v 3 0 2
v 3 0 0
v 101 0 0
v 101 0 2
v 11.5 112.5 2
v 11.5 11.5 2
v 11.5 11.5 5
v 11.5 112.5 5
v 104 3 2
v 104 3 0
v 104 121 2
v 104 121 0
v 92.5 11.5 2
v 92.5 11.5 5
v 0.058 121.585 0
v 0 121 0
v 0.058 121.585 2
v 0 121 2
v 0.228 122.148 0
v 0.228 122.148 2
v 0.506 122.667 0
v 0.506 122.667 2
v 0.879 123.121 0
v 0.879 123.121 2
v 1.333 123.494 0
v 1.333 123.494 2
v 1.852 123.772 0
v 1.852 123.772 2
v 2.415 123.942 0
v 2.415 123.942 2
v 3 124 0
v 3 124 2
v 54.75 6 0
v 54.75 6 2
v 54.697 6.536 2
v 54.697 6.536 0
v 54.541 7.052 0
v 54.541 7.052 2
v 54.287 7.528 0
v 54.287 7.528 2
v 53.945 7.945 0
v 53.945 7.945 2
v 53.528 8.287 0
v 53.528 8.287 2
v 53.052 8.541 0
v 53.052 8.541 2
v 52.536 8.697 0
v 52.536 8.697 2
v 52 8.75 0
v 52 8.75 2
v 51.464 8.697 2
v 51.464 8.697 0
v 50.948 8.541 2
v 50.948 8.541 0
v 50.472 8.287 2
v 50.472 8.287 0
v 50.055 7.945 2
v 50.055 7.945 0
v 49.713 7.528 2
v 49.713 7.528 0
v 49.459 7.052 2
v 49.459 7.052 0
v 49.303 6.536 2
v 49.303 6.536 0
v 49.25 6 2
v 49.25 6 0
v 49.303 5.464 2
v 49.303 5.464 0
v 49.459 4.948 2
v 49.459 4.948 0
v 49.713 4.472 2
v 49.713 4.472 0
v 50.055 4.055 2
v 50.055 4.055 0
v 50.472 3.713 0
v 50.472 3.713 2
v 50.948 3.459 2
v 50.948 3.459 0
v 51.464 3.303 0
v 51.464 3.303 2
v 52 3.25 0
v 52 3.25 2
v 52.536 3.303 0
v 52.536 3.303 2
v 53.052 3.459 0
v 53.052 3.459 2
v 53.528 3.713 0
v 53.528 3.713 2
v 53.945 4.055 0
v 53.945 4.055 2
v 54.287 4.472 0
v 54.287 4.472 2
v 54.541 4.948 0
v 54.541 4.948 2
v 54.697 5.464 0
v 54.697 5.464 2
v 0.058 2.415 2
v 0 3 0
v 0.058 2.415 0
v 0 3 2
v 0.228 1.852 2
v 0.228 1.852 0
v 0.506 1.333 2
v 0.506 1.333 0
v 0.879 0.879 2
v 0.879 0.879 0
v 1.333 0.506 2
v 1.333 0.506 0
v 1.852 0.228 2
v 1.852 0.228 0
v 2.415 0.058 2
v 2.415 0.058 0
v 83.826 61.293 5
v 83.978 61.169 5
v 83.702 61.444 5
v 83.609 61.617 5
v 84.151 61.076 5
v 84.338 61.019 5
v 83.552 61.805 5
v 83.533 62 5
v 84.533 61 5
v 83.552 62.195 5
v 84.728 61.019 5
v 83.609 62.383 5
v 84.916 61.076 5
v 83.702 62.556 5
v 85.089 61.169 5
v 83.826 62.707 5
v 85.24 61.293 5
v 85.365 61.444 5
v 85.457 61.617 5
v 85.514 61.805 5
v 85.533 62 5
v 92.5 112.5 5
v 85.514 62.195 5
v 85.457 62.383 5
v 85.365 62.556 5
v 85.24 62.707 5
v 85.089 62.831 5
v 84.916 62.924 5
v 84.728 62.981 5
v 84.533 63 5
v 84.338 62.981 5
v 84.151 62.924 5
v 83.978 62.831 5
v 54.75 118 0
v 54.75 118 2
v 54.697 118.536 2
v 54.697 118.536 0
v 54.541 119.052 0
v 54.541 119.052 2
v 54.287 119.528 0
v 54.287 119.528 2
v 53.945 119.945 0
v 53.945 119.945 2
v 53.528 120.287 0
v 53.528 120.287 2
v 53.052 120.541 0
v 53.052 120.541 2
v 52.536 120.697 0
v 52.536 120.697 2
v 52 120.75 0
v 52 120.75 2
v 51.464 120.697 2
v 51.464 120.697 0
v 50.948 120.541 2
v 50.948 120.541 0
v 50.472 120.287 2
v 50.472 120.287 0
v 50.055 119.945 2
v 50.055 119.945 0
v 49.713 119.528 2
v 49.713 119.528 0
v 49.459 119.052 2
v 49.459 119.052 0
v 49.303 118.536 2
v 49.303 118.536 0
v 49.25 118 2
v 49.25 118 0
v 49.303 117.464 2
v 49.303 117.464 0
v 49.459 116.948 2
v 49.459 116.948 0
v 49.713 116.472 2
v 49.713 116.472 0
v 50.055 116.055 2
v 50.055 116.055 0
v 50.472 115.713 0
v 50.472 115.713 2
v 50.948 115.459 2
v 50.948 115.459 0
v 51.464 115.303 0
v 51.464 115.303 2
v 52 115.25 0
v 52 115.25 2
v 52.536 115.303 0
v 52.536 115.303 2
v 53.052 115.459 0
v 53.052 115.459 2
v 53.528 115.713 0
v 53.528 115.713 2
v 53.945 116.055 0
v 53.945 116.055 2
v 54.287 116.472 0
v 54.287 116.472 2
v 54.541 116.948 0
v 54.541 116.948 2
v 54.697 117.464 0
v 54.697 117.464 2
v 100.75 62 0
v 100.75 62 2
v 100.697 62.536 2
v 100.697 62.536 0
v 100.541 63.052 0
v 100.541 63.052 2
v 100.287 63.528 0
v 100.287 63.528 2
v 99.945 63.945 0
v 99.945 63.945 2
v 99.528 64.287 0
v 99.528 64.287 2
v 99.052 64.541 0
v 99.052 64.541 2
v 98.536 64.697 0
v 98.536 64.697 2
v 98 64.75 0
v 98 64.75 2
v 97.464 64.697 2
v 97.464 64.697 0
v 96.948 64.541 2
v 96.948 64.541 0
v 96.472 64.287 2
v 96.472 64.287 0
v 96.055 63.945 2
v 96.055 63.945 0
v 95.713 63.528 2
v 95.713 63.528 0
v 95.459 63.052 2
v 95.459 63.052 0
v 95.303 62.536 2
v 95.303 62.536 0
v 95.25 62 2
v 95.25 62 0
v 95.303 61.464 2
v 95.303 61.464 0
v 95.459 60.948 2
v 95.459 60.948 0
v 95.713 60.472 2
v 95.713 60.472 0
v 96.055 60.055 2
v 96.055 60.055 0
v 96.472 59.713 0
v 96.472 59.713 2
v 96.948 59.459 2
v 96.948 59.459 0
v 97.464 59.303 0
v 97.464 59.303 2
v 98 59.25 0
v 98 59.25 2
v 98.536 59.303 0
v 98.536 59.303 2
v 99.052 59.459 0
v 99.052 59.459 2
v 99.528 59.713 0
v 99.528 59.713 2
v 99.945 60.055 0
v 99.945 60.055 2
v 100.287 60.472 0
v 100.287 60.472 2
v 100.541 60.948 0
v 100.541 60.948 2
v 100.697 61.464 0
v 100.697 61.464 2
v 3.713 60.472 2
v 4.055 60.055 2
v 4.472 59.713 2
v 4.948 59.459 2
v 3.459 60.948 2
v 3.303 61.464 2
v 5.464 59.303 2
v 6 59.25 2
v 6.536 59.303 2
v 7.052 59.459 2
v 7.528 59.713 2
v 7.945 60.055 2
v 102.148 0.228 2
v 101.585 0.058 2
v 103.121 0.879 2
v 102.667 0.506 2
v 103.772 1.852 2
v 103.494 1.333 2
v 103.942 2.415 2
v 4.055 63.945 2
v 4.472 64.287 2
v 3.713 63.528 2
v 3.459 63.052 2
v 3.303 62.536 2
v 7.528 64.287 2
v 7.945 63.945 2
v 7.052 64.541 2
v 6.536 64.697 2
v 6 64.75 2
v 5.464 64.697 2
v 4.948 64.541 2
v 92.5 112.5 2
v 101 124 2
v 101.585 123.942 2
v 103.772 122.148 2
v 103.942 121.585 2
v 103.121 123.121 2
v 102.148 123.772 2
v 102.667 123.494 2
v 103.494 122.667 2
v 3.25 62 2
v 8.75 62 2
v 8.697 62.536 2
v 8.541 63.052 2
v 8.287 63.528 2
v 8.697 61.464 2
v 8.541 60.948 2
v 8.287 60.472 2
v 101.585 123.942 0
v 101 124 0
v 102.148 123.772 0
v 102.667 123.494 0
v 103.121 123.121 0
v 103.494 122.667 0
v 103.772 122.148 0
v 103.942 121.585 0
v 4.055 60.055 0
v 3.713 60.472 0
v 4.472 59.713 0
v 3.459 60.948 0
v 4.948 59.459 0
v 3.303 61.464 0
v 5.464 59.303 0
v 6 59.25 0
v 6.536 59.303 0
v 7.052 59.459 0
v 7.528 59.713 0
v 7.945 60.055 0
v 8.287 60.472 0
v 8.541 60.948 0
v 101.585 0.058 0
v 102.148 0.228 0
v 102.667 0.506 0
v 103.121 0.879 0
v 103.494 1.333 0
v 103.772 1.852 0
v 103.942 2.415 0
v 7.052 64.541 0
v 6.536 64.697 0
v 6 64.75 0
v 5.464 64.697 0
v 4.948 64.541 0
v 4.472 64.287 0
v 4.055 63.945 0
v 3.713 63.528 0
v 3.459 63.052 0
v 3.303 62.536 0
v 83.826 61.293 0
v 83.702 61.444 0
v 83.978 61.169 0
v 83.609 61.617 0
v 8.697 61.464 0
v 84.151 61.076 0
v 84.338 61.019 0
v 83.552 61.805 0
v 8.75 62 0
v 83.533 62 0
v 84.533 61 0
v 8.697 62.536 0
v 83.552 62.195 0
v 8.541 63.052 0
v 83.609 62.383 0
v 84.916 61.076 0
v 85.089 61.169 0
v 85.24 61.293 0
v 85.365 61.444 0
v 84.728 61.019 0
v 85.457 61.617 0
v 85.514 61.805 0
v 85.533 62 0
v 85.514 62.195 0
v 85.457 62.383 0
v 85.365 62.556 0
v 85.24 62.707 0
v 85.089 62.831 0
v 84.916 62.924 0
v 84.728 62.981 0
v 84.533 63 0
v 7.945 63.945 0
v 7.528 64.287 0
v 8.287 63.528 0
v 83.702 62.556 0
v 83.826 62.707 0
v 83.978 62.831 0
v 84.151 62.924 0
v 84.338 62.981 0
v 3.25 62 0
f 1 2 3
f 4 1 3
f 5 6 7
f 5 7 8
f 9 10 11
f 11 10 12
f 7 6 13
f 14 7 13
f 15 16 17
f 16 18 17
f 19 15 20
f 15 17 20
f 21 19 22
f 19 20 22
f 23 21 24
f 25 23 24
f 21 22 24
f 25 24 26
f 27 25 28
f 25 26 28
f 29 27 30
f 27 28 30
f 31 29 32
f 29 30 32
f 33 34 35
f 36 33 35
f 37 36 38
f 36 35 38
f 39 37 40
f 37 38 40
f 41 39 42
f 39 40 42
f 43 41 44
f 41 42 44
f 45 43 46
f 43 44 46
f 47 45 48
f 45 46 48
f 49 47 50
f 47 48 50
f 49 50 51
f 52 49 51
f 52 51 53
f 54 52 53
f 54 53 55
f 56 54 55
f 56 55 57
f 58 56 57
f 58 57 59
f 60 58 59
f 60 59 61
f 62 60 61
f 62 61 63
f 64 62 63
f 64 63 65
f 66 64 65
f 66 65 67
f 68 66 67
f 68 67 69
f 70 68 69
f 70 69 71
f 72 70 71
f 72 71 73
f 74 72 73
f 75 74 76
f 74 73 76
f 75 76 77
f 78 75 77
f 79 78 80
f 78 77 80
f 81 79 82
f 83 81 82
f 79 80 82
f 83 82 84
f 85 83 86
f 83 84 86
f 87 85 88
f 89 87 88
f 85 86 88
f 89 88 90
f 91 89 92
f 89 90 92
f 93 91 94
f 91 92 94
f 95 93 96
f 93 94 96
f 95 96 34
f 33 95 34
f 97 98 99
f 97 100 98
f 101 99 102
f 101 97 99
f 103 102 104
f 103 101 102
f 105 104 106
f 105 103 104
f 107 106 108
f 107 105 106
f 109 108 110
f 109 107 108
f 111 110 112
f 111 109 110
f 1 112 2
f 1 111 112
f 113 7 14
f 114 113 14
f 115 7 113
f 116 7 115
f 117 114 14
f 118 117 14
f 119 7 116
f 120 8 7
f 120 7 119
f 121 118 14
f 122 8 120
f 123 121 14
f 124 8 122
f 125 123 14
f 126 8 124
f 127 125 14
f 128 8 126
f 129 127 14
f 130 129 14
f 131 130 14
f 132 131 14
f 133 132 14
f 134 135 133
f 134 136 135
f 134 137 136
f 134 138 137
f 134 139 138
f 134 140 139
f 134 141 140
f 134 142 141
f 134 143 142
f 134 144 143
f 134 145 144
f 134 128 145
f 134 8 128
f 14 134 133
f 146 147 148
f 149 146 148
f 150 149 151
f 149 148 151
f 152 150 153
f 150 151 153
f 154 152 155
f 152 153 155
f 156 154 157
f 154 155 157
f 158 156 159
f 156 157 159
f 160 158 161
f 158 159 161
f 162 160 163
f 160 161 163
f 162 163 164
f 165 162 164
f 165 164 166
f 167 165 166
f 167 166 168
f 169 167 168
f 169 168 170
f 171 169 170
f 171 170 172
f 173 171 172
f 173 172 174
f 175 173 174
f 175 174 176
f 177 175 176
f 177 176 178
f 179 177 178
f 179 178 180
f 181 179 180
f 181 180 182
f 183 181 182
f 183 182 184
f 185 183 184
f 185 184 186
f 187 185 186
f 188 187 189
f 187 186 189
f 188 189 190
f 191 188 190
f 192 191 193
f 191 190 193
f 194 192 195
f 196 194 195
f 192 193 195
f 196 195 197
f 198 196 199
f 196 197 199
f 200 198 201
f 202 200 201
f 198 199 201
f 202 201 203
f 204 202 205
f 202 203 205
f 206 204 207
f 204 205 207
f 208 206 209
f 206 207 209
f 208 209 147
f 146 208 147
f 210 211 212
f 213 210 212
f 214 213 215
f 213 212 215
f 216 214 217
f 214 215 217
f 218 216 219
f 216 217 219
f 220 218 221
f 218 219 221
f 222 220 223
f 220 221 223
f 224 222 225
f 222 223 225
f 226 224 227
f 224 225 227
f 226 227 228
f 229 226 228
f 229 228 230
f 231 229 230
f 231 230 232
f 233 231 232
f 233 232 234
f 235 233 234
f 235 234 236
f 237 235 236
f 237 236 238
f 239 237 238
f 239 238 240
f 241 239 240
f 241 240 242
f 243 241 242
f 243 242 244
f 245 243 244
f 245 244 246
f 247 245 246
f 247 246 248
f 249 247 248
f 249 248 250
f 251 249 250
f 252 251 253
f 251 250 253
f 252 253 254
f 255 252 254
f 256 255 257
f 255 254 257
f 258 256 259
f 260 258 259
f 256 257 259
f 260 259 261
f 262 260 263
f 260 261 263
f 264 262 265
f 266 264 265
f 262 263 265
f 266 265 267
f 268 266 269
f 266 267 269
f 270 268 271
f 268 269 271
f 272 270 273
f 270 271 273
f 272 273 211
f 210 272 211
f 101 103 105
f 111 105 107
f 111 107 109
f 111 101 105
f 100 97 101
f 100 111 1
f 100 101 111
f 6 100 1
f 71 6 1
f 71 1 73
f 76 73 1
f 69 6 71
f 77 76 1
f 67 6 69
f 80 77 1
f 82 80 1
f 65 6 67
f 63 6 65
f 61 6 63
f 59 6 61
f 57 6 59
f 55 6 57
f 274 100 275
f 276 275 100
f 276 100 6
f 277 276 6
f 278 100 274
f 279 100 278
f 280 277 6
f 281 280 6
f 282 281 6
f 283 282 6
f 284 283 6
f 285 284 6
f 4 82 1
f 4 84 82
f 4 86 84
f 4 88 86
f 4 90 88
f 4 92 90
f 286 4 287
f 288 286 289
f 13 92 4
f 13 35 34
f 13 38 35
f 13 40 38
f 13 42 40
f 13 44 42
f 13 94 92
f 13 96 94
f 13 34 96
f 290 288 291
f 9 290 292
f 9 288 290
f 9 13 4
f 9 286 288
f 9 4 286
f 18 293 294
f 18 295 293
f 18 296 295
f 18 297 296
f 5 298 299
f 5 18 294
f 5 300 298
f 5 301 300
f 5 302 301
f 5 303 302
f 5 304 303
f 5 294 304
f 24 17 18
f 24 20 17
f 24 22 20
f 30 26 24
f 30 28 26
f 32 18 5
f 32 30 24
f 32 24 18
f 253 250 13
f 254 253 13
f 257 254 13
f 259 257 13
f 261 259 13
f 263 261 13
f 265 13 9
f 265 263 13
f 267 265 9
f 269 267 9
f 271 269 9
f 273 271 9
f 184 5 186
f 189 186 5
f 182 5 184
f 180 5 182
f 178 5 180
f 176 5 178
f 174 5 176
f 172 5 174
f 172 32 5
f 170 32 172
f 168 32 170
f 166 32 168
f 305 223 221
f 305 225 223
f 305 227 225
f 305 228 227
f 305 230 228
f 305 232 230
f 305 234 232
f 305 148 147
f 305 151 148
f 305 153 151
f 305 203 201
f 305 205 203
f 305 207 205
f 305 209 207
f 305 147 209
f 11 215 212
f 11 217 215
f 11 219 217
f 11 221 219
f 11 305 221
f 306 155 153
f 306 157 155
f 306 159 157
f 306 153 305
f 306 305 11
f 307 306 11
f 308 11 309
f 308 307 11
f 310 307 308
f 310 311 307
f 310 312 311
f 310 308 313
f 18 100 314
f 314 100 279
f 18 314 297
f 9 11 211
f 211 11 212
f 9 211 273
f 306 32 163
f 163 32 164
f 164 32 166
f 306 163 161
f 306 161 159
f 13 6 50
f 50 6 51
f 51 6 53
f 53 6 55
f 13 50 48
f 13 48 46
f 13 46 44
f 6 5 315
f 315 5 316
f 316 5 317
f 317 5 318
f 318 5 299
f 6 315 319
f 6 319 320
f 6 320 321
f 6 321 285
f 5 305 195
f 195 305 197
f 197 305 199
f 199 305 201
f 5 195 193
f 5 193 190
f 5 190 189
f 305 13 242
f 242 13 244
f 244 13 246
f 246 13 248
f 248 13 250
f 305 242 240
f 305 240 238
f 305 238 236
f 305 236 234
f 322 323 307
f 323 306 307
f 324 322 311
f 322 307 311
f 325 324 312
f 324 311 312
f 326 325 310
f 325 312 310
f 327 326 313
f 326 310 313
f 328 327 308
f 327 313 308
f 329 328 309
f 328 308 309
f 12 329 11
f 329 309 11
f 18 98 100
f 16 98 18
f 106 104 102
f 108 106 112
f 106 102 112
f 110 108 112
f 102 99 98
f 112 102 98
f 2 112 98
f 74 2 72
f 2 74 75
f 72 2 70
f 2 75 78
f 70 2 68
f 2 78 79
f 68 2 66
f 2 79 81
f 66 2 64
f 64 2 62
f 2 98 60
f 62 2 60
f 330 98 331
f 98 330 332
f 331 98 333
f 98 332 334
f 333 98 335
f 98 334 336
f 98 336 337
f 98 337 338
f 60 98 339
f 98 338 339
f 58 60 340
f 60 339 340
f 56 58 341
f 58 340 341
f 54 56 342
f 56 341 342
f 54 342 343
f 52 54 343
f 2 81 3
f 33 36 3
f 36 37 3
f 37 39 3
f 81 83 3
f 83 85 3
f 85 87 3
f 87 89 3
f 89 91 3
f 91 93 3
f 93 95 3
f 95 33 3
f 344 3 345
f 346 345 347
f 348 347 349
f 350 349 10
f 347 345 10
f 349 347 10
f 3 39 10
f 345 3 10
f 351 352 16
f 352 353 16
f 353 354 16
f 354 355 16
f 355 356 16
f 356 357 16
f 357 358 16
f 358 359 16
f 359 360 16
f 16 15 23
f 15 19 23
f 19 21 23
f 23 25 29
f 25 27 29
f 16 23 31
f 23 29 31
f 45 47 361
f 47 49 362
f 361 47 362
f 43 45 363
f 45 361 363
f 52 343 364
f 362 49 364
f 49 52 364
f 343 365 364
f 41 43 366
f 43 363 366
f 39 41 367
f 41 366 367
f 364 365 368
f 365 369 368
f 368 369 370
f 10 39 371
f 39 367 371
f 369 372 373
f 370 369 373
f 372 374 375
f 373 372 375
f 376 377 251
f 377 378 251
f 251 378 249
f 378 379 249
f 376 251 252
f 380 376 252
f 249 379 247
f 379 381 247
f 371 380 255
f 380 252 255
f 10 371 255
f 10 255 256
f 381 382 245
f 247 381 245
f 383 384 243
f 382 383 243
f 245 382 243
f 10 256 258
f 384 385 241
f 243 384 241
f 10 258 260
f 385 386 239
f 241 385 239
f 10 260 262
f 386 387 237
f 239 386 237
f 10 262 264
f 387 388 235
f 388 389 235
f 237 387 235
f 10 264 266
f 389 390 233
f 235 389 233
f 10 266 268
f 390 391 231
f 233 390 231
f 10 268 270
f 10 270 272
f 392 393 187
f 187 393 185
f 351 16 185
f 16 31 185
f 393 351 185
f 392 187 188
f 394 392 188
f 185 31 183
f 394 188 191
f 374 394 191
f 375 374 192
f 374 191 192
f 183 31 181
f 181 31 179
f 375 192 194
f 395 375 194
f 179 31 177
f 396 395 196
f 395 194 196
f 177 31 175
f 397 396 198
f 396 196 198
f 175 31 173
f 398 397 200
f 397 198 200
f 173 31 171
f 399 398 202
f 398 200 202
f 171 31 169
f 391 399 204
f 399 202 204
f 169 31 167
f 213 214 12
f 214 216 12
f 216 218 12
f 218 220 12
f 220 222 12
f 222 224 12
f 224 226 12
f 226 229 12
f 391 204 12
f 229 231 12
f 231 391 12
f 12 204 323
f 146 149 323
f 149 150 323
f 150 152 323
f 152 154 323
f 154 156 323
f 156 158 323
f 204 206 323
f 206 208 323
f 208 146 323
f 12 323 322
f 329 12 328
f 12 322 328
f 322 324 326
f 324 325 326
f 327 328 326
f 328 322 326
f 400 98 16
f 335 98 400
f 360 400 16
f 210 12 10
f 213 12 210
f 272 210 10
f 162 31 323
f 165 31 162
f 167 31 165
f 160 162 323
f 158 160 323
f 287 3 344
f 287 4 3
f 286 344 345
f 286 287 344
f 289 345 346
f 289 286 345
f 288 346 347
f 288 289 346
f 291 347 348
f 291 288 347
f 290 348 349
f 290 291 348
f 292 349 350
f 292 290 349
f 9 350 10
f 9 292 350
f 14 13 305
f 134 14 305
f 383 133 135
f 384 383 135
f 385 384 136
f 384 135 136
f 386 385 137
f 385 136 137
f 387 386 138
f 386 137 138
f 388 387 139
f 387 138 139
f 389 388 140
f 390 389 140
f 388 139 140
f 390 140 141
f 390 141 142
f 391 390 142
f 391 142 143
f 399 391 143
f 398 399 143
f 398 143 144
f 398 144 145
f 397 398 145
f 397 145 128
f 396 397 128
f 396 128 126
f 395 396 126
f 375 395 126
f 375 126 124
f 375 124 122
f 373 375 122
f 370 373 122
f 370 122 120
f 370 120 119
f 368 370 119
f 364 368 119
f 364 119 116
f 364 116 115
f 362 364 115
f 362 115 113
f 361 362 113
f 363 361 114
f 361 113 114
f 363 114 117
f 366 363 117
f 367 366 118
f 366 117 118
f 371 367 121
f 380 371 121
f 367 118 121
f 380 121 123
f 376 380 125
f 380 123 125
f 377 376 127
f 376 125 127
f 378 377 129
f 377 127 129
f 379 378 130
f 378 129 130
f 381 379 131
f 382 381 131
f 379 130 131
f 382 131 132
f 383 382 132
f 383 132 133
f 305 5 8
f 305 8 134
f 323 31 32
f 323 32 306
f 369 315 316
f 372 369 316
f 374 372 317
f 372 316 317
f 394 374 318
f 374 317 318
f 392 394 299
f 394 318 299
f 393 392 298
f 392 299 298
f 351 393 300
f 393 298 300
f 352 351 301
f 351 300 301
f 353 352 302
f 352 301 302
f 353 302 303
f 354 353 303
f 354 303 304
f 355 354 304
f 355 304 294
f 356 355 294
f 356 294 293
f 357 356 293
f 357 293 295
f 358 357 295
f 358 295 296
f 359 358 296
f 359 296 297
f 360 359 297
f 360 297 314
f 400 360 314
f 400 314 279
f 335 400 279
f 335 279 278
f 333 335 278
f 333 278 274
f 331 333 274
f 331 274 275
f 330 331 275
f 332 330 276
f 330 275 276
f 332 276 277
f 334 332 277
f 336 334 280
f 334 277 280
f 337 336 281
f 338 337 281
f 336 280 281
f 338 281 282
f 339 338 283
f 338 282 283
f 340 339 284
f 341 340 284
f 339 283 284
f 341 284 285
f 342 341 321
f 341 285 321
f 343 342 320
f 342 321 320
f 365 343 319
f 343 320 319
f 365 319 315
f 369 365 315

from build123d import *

# Parameters (mm, degrees)
SKETCH1_W           = 104
SKETCH1_H           = 124
BOSS_EXTRUDE1_DEPTH = 2
SKETCH4_W           = 81
SKETCH4_H           = 101
BOSS_EXTRUDE2_DEPTH = 3
SKETCH5_R           = 1
CUT_EXTRUDE1_DEPTH  = 162.916645222
FILLET1_R           = 3
SKETCH6_R           = 2.75
CUT_EXTRUDE3_DEPTH  = 162.867229543
SKETCH9_R           = 2.75
CUT_EXTRUDE4_DEPTH  = 162.867229543


with BuildPart() as part:
    # Sketch1 → Boss-Extrude1 (new body)
    with BuildSketch(Plane.XY):
        with Locations((52, 62)):
            Rectangle(SKETCH1_W, SKETCH1_H)
    extrude(amount=BOSS_EXTRUDE1_DEPTH)

    # Sketch4 → Boss-Extrude2 (add)
    with BuildSketch(Plane.XY.offset(2)):
        with Locations((52, 62)):
            Rectangle(SKETCH4_W, SKETCH4_H)
    extrude(amount=BOSS_EXTRUDE2_DEPTH)

    # Sketch5 → Cut-Extrude1 (cut, through all)
    with BuildSketch(Plane.XY.offset(5)):
        with Locations((84.533228661, 62)):
            Circle(SKETCH5_R)
    extrude(amount=-CUT_EXTRUDE1_DEPTH, mode=Mode.SUBTRACT)

    # Fillet1
    fillet1_edges = [part.edges().sort_by_distance(p)[0] for p in [
        (0, 0, 1),
        (104, 0, 1),
        (104, 124, 1),
        (0, 124, 1),
    ]]
    fillet(fillet1_edges, radius=FILLET1_R)

    # Sketch6 → Cut-Extrude3 (cut, through all)
    with BuildSketch(Plane.XY.offset(2)):
        with Locations((98, 62)):
            Circle(SKETCH6_R)
        with Locations((6, 62)):
            Circle(SKETCH6_R)
    extrude(amount=-CUT_EXTRUDE3_DEPTH, mode=Mode.SUBTRACT)

    # Sketch9 → Cut-Extrude4 (cut, through all)
    with BuildSketch(Plane.XY.offset(2)):
        with Locations((52, 6)):
            Circle(SKETCH9_R)
        with Locations((52, 118)):
            Circle(SKETCH9_R)
    extrude(amount=-CUT_EXTRUDE4_DEPTH, mode=Mode.SUBTRACT)


solid = part.part
